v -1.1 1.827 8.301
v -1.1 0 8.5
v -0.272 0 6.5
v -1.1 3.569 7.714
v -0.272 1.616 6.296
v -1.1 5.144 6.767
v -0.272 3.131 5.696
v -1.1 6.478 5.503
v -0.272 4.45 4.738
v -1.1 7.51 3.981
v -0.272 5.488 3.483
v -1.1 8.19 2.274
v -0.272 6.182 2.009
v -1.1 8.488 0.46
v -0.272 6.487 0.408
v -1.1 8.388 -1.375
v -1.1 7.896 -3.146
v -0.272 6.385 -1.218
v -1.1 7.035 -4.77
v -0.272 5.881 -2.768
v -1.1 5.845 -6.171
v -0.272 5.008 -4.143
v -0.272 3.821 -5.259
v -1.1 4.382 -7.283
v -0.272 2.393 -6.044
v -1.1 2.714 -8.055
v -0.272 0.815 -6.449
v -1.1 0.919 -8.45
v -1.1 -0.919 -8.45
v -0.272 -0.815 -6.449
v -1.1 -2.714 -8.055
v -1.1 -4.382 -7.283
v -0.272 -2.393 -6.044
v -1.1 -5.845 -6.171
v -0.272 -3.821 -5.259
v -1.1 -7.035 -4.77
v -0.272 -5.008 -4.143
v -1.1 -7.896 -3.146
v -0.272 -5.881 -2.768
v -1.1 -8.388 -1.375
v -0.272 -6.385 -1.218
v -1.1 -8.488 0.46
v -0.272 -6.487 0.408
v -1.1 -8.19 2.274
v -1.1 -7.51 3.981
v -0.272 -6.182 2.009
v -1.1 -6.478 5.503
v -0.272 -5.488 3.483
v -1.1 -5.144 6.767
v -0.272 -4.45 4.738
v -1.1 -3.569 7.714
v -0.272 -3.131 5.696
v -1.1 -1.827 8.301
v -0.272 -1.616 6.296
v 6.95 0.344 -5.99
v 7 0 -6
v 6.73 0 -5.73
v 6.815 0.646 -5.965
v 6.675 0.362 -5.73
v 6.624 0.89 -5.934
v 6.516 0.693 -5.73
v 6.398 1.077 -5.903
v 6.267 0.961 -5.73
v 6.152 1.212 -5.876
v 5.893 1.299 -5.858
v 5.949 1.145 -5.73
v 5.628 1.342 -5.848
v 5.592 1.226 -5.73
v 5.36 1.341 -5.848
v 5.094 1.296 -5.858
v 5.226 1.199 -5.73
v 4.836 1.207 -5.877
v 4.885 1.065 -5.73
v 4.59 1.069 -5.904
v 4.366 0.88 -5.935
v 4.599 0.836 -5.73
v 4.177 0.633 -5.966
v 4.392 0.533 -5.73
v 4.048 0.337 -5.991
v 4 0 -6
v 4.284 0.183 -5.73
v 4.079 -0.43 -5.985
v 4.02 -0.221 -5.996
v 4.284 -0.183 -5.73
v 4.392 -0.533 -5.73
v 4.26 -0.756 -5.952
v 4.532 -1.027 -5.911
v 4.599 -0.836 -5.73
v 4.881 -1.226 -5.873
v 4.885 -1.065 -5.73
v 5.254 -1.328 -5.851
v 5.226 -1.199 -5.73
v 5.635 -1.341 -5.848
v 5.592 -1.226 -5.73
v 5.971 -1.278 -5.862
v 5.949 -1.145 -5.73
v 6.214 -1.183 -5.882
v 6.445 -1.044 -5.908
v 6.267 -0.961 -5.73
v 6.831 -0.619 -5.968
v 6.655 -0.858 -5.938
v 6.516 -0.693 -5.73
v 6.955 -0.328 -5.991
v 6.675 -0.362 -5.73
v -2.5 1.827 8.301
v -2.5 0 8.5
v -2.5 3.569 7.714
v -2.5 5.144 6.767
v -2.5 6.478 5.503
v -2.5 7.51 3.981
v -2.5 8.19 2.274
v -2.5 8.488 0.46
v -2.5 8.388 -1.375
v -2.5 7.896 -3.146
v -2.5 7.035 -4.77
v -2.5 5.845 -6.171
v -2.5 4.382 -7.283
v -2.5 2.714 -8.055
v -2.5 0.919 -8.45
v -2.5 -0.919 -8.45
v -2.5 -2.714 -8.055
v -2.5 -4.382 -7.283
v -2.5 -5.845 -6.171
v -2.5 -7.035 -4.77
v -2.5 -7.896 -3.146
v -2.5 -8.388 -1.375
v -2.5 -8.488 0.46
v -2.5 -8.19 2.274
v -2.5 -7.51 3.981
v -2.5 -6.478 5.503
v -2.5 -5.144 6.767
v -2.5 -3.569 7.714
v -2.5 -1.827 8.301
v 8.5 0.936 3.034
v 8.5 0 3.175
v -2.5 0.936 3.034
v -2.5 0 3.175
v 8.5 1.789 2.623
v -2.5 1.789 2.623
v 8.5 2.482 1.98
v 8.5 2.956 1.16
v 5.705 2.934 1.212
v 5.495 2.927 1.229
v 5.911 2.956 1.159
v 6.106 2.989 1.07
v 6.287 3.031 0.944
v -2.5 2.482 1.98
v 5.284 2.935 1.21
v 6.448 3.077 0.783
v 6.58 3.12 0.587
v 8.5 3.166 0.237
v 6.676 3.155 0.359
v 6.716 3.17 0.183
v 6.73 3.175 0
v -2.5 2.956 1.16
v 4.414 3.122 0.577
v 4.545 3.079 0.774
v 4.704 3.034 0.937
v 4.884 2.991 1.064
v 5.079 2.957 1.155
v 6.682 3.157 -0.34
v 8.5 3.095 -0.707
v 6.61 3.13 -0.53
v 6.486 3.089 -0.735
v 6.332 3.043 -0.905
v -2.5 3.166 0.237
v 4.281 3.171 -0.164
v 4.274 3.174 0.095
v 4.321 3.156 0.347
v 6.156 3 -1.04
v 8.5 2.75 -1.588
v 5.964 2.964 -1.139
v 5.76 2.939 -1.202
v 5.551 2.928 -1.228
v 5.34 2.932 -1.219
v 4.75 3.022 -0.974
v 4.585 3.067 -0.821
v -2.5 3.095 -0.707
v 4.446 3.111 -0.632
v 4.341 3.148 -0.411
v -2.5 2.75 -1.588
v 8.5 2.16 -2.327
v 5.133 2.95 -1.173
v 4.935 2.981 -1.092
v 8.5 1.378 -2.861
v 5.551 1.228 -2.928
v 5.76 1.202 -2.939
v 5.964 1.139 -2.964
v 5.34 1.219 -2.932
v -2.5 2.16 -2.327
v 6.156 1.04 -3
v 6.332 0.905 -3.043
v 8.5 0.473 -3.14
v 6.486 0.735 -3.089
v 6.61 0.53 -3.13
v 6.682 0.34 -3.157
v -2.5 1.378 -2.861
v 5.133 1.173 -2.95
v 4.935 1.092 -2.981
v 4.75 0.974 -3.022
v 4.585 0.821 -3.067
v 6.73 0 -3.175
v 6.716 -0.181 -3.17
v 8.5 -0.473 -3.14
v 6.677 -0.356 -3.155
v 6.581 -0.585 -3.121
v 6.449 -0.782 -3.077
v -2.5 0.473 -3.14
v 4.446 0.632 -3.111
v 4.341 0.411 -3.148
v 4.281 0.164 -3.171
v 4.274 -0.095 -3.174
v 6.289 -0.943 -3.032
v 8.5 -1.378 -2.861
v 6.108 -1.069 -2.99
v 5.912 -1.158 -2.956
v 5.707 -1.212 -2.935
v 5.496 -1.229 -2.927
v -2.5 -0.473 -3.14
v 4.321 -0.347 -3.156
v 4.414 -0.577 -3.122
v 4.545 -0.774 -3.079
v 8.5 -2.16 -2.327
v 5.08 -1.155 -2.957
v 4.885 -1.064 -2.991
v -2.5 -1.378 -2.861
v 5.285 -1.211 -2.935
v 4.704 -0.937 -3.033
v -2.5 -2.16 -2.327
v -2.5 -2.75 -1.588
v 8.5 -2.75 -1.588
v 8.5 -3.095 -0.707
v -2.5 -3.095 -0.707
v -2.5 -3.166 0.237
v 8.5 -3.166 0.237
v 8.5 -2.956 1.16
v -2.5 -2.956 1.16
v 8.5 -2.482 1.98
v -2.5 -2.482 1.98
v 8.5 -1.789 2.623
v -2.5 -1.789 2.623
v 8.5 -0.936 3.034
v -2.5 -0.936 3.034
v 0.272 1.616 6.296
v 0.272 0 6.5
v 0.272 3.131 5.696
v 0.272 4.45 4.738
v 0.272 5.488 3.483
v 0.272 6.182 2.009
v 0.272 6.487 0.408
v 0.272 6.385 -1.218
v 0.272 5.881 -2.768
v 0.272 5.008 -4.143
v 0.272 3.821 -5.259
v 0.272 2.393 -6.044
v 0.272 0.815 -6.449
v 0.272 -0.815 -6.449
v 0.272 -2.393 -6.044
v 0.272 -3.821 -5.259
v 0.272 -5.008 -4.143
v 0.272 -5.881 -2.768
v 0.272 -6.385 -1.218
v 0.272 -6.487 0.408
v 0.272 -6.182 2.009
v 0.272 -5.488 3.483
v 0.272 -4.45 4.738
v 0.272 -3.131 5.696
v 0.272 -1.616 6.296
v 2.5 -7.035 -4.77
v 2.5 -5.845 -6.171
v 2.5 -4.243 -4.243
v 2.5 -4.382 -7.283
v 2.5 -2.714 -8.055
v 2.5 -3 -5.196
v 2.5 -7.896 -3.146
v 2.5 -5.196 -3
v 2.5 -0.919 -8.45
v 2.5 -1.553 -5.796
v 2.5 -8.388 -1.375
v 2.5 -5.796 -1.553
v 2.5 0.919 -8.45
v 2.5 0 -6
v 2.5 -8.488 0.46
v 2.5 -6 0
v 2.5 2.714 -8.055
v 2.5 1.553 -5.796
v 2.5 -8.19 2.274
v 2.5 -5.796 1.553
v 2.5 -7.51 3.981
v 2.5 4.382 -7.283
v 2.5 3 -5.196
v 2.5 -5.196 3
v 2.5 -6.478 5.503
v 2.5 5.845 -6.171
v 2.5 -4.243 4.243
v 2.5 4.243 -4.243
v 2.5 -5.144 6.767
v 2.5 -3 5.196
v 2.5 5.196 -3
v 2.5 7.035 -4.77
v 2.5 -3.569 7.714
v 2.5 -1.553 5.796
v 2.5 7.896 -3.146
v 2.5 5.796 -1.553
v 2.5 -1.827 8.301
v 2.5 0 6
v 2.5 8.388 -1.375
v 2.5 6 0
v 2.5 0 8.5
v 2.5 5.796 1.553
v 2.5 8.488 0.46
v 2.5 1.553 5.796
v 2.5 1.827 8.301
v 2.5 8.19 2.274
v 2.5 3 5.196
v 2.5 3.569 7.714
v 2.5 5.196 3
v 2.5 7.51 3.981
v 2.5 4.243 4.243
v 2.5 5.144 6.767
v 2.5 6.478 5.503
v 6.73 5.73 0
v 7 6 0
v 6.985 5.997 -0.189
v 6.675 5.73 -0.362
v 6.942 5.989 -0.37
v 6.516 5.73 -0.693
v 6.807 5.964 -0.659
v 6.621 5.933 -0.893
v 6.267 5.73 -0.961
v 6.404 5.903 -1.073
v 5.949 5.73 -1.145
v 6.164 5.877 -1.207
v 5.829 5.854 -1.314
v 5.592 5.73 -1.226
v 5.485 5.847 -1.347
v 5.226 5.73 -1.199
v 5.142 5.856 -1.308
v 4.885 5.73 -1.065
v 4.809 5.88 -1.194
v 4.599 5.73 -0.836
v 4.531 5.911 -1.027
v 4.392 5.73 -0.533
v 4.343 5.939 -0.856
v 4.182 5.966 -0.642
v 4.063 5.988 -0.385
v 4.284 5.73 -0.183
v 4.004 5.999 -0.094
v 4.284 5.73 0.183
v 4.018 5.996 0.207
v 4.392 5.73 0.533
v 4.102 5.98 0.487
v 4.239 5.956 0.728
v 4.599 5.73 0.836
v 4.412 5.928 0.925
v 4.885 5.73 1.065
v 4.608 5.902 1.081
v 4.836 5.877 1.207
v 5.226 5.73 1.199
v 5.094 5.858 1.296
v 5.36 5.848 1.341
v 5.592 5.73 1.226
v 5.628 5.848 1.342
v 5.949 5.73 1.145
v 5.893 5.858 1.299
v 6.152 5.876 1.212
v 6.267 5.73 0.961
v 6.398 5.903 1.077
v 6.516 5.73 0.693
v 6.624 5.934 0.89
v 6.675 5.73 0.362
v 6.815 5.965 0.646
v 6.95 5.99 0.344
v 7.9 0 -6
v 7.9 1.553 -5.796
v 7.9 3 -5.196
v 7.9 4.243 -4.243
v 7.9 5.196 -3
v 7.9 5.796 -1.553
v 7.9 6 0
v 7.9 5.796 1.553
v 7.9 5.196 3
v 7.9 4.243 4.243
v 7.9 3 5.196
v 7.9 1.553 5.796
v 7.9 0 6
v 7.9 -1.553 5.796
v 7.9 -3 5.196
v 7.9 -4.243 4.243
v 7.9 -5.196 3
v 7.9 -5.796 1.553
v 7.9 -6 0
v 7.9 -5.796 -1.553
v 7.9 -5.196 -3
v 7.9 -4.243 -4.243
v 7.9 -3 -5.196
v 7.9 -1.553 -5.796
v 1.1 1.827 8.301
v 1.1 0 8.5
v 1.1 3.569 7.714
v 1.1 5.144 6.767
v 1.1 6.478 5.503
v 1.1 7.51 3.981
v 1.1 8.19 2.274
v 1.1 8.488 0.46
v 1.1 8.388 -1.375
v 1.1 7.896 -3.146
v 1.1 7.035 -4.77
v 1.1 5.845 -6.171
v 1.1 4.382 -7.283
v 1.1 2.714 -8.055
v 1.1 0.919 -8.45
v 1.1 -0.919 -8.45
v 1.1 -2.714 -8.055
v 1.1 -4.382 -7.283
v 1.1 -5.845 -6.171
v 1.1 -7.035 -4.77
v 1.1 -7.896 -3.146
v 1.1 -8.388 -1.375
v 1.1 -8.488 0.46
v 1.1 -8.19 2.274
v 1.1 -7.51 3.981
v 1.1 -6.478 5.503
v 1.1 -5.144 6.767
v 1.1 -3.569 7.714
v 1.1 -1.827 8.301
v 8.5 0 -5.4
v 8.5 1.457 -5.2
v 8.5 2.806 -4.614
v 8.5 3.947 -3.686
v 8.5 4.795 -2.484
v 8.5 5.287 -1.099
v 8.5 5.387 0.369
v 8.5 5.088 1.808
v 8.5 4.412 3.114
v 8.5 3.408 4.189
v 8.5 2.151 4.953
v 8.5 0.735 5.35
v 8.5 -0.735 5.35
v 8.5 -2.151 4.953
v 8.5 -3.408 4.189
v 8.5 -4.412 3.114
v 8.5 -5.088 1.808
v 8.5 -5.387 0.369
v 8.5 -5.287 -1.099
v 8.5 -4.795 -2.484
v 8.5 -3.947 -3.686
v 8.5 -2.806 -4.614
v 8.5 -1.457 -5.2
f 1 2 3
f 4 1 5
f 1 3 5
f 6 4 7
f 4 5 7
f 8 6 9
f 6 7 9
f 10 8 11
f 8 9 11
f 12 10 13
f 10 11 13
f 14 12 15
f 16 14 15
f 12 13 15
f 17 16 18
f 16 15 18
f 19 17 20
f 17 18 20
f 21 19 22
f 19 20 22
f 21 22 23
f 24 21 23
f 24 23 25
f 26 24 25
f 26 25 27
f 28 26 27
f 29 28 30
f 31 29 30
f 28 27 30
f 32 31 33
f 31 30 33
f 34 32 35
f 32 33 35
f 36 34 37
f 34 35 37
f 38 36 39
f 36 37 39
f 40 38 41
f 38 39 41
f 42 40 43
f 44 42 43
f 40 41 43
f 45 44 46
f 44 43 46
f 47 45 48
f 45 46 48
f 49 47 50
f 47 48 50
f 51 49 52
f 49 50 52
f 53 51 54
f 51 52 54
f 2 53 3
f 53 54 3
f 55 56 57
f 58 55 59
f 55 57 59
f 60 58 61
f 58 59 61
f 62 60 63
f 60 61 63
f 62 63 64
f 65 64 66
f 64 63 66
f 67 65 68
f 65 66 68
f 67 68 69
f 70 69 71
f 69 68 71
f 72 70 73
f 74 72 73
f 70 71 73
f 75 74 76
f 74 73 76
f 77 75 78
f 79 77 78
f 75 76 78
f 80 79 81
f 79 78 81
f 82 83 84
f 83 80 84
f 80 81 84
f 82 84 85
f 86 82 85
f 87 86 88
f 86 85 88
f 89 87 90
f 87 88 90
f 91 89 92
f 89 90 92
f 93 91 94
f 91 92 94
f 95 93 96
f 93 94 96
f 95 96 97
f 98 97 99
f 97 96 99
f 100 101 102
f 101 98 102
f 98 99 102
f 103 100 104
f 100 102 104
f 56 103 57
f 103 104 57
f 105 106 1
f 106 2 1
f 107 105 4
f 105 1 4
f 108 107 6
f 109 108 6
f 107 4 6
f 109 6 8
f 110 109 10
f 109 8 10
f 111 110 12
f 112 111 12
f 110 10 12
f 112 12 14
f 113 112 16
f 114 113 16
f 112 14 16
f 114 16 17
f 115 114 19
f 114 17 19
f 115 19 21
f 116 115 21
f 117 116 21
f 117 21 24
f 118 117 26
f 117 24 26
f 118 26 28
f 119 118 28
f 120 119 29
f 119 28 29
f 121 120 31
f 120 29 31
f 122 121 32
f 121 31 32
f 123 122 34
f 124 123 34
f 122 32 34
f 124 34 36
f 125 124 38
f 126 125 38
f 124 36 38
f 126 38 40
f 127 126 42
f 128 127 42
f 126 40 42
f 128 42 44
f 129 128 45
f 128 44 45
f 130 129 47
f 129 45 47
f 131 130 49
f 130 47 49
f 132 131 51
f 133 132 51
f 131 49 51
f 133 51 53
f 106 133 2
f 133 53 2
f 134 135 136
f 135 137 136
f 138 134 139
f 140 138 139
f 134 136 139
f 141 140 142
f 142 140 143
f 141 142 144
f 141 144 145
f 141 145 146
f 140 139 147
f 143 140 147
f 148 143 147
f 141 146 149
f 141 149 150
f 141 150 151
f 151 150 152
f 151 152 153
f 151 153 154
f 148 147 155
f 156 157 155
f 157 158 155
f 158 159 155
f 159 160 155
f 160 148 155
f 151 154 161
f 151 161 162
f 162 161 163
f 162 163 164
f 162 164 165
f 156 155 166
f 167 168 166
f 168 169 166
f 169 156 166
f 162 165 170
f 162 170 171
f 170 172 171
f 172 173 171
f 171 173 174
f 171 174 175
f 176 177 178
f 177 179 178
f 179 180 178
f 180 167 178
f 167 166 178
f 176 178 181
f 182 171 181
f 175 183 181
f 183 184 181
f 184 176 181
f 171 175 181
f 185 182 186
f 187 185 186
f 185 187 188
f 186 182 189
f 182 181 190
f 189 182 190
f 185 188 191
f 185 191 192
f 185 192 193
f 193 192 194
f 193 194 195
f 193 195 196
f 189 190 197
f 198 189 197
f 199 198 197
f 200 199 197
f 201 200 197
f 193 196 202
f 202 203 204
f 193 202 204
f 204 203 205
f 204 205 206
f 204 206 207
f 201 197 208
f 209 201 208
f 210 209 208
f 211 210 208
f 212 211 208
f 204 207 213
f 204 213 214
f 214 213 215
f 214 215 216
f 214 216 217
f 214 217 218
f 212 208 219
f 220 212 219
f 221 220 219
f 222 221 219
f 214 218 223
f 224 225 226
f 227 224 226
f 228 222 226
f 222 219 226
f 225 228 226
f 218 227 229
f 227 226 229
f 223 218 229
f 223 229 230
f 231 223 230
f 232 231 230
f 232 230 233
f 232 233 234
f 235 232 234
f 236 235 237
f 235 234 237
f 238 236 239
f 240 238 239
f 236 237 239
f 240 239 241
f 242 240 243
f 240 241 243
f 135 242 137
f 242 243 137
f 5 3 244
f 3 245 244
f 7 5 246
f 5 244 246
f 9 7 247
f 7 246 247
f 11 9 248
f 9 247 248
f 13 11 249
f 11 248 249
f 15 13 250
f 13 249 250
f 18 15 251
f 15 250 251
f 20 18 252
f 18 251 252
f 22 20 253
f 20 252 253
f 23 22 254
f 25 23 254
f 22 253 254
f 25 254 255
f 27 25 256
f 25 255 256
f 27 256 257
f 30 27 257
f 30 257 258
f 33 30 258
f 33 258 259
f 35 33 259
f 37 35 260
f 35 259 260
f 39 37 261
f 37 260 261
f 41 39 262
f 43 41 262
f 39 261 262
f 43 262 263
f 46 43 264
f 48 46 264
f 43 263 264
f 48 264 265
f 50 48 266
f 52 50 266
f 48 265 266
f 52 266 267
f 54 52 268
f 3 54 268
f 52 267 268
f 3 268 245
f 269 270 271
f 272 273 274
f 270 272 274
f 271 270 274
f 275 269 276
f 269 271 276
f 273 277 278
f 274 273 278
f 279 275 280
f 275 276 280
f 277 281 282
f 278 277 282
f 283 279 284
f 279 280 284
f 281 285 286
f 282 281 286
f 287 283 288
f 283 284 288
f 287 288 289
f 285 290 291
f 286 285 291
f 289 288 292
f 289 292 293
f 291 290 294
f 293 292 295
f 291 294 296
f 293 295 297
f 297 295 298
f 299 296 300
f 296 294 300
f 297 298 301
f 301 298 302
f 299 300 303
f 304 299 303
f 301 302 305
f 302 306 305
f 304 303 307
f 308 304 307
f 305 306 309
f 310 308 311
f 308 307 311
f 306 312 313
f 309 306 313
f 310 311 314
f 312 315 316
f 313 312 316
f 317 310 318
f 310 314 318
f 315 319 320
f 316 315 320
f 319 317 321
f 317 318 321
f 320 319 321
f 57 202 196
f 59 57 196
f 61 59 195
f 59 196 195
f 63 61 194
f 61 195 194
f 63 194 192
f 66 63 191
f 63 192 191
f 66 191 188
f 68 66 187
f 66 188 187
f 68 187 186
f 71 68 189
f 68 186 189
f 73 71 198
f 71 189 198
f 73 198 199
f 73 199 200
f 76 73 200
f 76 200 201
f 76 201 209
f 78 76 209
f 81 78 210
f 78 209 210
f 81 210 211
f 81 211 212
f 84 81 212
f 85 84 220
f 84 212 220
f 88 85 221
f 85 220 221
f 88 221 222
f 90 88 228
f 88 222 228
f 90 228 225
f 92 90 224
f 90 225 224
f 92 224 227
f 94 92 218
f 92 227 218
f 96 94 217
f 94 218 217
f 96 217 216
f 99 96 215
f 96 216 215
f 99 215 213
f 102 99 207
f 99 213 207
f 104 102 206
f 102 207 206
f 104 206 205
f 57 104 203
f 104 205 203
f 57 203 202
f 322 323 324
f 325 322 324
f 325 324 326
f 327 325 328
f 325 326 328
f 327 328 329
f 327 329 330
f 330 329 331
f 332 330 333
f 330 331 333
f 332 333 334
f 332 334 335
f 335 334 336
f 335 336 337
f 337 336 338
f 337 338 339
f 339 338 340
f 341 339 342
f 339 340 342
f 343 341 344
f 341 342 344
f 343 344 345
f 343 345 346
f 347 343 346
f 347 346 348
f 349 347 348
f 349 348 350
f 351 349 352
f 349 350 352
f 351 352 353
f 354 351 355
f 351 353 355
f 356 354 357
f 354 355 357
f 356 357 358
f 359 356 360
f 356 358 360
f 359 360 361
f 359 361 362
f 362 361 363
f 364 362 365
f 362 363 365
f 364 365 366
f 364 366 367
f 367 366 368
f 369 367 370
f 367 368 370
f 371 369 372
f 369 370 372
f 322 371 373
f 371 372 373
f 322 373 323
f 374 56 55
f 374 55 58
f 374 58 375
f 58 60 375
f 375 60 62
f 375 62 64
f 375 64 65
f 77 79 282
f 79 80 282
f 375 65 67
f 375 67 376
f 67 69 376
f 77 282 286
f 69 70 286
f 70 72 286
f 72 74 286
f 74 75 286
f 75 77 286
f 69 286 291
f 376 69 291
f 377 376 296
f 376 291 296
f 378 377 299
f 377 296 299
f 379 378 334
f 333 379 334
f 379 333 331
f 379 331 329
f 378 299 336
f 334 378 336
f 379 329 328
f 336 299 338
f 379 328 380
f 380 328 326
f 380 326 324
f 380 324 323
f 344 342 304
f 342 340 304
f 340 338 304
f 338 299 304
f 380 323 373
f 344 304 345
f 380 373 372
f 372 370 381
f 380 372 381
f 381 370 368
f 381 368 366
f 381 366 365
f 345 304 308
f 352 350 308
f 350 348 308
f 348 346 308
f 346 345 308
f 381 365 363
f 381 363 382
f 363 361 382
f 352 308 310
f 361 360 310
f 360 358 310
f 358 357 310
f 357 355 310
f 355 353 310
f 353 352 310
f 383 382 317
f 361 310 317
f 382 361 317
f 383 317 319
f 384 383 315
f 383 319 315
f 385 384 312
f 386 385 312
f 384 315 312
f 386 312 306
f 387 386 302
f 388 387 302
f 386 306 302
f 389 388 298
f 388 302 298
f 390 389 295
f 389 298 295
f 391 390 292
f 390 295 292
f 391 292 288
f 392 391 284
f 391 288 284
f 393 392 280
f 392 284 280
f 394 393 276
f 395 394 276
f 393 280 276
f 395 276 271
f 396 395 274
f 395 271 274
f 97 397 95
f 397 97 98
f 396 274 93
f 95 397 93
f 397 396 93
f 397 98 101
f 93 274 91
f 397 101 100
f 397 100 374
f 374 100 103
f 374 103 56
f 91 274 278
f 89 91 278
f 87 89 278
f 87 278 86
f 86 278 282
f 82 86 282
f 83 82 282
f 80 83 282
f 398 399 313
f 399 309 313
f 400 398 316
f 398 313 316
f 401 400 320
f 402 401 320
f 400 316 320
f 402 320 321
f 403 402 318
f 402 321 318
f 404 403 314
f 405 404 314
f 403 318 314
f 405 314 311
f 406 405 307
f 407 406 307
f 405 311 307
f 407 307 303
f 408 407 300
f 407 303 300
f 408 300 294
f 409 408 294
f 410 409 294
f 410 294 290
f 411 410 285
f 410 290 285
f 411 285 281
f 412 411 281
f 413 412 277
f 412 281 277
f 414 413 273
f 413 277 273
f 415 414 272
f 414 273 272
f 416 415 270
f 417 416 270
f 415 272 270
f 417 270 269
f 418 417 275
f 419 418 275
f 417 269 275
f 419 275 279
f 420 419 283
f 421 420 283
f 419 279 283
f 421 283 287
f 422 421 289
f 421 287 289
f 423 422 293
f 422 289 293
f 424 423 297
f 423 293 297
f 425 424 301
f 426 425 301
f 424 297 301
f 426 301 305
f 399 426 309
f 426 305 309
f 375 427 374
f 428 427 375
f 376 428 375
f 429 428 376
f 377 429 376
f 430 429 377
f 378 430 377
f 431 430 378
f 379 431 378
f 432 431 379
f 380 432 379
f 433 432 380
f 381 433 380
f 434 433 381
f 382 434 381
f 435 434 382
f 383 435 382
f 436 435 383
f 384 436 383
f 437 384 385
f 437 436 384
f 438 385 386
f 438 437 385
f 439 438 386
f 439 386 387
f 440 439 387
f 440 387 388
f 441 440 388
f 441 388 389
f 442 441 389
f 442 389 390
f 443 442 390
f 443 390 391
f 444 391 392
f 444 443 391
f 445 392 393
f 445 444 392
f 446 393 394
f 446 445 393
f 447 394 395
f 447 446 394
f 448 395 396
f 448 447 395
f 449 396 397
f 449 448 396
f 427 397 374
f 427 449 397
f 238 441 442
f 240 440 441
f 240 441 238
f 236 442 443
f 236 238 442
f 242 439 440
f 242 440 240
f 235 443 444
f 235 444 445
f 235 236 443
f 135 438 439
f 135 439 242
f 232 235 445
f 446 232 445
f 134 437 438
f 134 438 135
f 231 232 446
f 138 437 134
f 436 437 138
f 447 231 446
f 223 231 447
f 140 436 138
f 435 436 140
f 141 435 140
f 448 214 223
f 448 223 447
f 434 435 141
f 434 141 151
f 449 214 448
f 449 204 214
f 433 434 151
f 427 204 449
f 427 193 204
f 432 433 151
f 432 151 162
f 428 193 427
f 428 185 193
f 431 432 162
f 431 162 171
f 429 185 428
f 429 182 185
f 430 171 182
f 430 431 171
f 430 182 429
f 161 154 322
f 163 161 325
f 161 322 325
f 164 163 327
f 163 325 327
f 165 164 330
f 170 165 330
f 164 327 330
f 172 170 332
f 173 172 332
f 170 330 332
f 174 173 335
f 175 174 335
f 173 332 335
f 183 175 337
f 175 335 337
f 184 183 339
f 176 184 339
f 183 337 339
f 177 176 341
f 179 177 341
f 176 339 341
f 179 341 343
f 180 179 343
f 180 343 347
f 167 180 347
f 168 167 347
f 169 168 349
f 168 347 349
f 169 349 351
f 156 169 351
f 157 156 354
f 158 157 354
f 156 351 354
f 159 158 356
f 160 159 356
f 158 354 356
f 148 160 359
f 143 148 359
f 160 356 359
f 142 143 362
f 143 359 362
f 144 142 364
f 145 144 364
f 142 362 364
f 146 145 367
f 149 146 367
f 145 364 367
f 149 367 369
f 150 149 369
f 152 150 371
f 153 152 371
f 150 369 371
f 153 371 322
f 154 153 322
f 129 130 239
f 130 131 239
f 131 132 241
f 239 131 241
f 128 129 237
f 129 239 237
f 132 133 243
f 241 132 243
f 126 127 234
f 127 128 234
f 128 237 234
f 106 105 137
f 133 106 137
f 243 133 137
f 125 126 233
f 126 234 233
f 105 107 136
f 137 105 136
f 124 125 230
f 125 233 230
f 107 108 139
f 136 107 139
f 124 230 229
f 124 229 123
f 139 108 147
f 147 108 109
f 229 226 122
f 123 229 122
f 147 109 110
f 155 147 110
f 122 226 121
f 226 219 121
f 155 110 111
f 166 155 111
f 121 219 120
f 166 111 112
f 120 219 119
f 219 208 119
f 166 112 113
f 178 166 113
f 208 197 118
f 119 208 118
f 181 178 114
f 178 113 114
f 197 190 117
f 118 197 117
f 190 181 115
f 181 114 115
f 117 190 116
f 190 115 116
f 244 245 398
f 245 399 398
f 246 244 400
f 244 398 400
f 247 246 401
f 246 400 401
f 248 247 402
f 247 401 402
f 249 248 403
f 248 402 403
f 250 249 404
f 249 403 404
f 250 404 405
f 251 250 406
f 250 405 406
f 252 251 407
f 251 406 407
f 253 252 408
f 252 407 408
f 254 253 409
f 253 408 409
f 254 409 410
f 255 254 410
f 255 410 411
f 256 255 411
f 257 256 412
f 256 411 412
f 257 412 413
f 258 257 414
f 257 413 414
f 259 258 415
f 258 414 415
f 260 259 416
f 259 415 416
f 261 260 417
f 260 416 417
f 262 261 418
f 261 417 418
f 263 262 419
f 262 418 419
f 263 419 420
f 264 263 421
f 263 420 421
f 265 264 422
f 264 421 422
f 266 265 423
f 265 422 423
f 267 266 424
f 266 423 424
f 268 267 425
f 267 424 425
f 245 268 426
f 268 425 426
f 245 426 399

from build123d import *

# Parameters (mm, degrees)
SKETCH2_R           = 6
BOSS_EXTRUDE1_DEPTH = 6
HOLE1_D             = 6.35
CHAMFER1_SIZE       = 0.6


# Read off the part's stored shape, not the designer's step: CSK for M2 Flat Head Machine Screw1, CSK for M2 Flat Head Machine Screw2
with BuildPart() as part:
    # Sketch1 → Revolve1 (revolve)
    with BuildSketch(Plane(origin=(0, 0, 0), x_dir=(-1, 0, 0), z_dir=(0, 0, -1)), mode=Mode.PRIVATE) as revolve1_sk:
        Polygon((-2.5, 8.5), (-2.5, 0), (2.5, 0), (2.5, 8.5), (1.1, 8.5), (0.271572875, 6.5), (-0.271572875, 6.5), (-1.1, 8.5), align=None)
    revolve(revolve1_sk.sketch.rotate(Axis((2.5, 0, 0), (-1, 0, 0)), 270), axis=Axis((2.5, 0, 0), (-1, 0, 0)))

    # Sketch2 → Boss-Extrude1 (add)
    with BuildSketch(Plane(origin=(2.5, 0, 0), x_dir=(0, 0, -1), z_dir=(1, 0, 0))):
        Circle(SKETCH2_R)
    extrude(amount=BOSS_EXTRUDE1_DEPTH)

    # Hole1 (through all)
    with Locations(Plane(origin=(8.5, 0, 0), x_dir=(0, 0, -1), z_dir=(1, 0, 0))):
        with Locations((0, 0)):
            Hole(HOLE1_D / 2)

    # CSK for M2 Flat Head Machine Screw1 outl → CSK for M2 Flat Head Machine Screw1 (revolve, cut)
    with BuildSketch(Plane(origin=(5.5, 0, 0), x_dir=(1, 0, 0), z_dir=(0, -1, 0))):
        Polygon((0, -6.000000161), (1.500000161, -6.000000161), (1.2295, -5.7295), (1.2295, -2.927170217), (0, -2.927170217), align=None)
    revolve(axis=Axis((5.5, 0, 0), (0, 0, 1)), mode=Mode.SUBTRACT)

    # CSK for M2 Flat Head Machine Screw2 outl → CSK for M2 Flat Head Machine Screw2 (revolve, cut)
    with BuildSketch(Plane(origin=(5.5, 0, 0), x_dir=(1, 0, 0), z_dir=(0, 0, 1))):
        Polygon((1.500065457, 6.000065457), (0, 6.000065457), (0, 2.927130581), (1.2295, 2.927130581), (1.2295, 5.7295), align=None)
    revolve(axis=Axis((5.5, 0, 0), (0, 1, 0)), mode=Mode.SUBTRACT)

    # Chamfer1
    chamfer1_edges = [part.edges().sort_by_distance(p)[0] for p in [
        (8.5, 0, 6),
    ]]
    chamfer(chamfer1_edges, length=CHAMFER1_SIZE)


solid = part.part
